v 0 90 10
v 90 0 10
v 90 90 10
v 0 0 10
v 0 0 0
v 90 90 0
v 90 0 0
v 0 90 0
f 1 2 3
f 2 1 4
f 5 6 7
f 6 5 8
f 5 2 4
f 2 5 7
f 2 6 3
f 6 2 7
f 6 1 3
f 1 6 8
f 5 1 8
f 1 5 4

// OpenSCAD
//idea: https://everythingren.com/products/white-valet-phone-dock
//GONNA GIT THIS SHIT GOOD MA DUDES
amt = 2;
res = 20;

/*MAIN SHAPE*/
baseWidth = 0;

/*PHONE SLOT INFO*/
slotWidth = 10;
slotDepth = 0; //Fill out

/*BASE SHAPE INFO*/
len = 100;
width = 100;
depth = 0;


module main(){
    roundedCube([100,100,10]);
    //phoneSlot();
}


module roundedCube(size=[1,1,1], center=false, incl=true){
    t = [0,0,0];
    if(incl){
        t = [size[2], size[2],0];
        echo(t);
    }
    echo(t);
    translate(t);
    cube([size[0]-size[2], 
          size[1]-size[2], 
          size[2]], center);
}

main();

module phoneSlot(t=[0,0,0]){
    translate(t){
        cube([len-20,slotWidth,10]);
        rotate([0,90,0]){
            translate([-5,0,0])
            cylinder(len-20, r=5, $fn=res);
            translate([-5,slotWidth,0])
            cylinder(len-20, r=5, $fn=res);
        }
        rotate([90,0,0]){
            translate([0,5,-slotWidth])
            cylinder(slotWidth, r=5, $fn=res);
            translate([len-20,5,-slotWidth])
            cylinder(slotWidth, r=5, $fn=res);
        }
        translate([0,0,5]){
            sphere(5);
            translate([0,slotWidth,0])
            sphere(5);
            translate([80,0,0])
            sphere(5);
            translate([80,slotWidth,0])
            sphere(5);
        }
    }
}
